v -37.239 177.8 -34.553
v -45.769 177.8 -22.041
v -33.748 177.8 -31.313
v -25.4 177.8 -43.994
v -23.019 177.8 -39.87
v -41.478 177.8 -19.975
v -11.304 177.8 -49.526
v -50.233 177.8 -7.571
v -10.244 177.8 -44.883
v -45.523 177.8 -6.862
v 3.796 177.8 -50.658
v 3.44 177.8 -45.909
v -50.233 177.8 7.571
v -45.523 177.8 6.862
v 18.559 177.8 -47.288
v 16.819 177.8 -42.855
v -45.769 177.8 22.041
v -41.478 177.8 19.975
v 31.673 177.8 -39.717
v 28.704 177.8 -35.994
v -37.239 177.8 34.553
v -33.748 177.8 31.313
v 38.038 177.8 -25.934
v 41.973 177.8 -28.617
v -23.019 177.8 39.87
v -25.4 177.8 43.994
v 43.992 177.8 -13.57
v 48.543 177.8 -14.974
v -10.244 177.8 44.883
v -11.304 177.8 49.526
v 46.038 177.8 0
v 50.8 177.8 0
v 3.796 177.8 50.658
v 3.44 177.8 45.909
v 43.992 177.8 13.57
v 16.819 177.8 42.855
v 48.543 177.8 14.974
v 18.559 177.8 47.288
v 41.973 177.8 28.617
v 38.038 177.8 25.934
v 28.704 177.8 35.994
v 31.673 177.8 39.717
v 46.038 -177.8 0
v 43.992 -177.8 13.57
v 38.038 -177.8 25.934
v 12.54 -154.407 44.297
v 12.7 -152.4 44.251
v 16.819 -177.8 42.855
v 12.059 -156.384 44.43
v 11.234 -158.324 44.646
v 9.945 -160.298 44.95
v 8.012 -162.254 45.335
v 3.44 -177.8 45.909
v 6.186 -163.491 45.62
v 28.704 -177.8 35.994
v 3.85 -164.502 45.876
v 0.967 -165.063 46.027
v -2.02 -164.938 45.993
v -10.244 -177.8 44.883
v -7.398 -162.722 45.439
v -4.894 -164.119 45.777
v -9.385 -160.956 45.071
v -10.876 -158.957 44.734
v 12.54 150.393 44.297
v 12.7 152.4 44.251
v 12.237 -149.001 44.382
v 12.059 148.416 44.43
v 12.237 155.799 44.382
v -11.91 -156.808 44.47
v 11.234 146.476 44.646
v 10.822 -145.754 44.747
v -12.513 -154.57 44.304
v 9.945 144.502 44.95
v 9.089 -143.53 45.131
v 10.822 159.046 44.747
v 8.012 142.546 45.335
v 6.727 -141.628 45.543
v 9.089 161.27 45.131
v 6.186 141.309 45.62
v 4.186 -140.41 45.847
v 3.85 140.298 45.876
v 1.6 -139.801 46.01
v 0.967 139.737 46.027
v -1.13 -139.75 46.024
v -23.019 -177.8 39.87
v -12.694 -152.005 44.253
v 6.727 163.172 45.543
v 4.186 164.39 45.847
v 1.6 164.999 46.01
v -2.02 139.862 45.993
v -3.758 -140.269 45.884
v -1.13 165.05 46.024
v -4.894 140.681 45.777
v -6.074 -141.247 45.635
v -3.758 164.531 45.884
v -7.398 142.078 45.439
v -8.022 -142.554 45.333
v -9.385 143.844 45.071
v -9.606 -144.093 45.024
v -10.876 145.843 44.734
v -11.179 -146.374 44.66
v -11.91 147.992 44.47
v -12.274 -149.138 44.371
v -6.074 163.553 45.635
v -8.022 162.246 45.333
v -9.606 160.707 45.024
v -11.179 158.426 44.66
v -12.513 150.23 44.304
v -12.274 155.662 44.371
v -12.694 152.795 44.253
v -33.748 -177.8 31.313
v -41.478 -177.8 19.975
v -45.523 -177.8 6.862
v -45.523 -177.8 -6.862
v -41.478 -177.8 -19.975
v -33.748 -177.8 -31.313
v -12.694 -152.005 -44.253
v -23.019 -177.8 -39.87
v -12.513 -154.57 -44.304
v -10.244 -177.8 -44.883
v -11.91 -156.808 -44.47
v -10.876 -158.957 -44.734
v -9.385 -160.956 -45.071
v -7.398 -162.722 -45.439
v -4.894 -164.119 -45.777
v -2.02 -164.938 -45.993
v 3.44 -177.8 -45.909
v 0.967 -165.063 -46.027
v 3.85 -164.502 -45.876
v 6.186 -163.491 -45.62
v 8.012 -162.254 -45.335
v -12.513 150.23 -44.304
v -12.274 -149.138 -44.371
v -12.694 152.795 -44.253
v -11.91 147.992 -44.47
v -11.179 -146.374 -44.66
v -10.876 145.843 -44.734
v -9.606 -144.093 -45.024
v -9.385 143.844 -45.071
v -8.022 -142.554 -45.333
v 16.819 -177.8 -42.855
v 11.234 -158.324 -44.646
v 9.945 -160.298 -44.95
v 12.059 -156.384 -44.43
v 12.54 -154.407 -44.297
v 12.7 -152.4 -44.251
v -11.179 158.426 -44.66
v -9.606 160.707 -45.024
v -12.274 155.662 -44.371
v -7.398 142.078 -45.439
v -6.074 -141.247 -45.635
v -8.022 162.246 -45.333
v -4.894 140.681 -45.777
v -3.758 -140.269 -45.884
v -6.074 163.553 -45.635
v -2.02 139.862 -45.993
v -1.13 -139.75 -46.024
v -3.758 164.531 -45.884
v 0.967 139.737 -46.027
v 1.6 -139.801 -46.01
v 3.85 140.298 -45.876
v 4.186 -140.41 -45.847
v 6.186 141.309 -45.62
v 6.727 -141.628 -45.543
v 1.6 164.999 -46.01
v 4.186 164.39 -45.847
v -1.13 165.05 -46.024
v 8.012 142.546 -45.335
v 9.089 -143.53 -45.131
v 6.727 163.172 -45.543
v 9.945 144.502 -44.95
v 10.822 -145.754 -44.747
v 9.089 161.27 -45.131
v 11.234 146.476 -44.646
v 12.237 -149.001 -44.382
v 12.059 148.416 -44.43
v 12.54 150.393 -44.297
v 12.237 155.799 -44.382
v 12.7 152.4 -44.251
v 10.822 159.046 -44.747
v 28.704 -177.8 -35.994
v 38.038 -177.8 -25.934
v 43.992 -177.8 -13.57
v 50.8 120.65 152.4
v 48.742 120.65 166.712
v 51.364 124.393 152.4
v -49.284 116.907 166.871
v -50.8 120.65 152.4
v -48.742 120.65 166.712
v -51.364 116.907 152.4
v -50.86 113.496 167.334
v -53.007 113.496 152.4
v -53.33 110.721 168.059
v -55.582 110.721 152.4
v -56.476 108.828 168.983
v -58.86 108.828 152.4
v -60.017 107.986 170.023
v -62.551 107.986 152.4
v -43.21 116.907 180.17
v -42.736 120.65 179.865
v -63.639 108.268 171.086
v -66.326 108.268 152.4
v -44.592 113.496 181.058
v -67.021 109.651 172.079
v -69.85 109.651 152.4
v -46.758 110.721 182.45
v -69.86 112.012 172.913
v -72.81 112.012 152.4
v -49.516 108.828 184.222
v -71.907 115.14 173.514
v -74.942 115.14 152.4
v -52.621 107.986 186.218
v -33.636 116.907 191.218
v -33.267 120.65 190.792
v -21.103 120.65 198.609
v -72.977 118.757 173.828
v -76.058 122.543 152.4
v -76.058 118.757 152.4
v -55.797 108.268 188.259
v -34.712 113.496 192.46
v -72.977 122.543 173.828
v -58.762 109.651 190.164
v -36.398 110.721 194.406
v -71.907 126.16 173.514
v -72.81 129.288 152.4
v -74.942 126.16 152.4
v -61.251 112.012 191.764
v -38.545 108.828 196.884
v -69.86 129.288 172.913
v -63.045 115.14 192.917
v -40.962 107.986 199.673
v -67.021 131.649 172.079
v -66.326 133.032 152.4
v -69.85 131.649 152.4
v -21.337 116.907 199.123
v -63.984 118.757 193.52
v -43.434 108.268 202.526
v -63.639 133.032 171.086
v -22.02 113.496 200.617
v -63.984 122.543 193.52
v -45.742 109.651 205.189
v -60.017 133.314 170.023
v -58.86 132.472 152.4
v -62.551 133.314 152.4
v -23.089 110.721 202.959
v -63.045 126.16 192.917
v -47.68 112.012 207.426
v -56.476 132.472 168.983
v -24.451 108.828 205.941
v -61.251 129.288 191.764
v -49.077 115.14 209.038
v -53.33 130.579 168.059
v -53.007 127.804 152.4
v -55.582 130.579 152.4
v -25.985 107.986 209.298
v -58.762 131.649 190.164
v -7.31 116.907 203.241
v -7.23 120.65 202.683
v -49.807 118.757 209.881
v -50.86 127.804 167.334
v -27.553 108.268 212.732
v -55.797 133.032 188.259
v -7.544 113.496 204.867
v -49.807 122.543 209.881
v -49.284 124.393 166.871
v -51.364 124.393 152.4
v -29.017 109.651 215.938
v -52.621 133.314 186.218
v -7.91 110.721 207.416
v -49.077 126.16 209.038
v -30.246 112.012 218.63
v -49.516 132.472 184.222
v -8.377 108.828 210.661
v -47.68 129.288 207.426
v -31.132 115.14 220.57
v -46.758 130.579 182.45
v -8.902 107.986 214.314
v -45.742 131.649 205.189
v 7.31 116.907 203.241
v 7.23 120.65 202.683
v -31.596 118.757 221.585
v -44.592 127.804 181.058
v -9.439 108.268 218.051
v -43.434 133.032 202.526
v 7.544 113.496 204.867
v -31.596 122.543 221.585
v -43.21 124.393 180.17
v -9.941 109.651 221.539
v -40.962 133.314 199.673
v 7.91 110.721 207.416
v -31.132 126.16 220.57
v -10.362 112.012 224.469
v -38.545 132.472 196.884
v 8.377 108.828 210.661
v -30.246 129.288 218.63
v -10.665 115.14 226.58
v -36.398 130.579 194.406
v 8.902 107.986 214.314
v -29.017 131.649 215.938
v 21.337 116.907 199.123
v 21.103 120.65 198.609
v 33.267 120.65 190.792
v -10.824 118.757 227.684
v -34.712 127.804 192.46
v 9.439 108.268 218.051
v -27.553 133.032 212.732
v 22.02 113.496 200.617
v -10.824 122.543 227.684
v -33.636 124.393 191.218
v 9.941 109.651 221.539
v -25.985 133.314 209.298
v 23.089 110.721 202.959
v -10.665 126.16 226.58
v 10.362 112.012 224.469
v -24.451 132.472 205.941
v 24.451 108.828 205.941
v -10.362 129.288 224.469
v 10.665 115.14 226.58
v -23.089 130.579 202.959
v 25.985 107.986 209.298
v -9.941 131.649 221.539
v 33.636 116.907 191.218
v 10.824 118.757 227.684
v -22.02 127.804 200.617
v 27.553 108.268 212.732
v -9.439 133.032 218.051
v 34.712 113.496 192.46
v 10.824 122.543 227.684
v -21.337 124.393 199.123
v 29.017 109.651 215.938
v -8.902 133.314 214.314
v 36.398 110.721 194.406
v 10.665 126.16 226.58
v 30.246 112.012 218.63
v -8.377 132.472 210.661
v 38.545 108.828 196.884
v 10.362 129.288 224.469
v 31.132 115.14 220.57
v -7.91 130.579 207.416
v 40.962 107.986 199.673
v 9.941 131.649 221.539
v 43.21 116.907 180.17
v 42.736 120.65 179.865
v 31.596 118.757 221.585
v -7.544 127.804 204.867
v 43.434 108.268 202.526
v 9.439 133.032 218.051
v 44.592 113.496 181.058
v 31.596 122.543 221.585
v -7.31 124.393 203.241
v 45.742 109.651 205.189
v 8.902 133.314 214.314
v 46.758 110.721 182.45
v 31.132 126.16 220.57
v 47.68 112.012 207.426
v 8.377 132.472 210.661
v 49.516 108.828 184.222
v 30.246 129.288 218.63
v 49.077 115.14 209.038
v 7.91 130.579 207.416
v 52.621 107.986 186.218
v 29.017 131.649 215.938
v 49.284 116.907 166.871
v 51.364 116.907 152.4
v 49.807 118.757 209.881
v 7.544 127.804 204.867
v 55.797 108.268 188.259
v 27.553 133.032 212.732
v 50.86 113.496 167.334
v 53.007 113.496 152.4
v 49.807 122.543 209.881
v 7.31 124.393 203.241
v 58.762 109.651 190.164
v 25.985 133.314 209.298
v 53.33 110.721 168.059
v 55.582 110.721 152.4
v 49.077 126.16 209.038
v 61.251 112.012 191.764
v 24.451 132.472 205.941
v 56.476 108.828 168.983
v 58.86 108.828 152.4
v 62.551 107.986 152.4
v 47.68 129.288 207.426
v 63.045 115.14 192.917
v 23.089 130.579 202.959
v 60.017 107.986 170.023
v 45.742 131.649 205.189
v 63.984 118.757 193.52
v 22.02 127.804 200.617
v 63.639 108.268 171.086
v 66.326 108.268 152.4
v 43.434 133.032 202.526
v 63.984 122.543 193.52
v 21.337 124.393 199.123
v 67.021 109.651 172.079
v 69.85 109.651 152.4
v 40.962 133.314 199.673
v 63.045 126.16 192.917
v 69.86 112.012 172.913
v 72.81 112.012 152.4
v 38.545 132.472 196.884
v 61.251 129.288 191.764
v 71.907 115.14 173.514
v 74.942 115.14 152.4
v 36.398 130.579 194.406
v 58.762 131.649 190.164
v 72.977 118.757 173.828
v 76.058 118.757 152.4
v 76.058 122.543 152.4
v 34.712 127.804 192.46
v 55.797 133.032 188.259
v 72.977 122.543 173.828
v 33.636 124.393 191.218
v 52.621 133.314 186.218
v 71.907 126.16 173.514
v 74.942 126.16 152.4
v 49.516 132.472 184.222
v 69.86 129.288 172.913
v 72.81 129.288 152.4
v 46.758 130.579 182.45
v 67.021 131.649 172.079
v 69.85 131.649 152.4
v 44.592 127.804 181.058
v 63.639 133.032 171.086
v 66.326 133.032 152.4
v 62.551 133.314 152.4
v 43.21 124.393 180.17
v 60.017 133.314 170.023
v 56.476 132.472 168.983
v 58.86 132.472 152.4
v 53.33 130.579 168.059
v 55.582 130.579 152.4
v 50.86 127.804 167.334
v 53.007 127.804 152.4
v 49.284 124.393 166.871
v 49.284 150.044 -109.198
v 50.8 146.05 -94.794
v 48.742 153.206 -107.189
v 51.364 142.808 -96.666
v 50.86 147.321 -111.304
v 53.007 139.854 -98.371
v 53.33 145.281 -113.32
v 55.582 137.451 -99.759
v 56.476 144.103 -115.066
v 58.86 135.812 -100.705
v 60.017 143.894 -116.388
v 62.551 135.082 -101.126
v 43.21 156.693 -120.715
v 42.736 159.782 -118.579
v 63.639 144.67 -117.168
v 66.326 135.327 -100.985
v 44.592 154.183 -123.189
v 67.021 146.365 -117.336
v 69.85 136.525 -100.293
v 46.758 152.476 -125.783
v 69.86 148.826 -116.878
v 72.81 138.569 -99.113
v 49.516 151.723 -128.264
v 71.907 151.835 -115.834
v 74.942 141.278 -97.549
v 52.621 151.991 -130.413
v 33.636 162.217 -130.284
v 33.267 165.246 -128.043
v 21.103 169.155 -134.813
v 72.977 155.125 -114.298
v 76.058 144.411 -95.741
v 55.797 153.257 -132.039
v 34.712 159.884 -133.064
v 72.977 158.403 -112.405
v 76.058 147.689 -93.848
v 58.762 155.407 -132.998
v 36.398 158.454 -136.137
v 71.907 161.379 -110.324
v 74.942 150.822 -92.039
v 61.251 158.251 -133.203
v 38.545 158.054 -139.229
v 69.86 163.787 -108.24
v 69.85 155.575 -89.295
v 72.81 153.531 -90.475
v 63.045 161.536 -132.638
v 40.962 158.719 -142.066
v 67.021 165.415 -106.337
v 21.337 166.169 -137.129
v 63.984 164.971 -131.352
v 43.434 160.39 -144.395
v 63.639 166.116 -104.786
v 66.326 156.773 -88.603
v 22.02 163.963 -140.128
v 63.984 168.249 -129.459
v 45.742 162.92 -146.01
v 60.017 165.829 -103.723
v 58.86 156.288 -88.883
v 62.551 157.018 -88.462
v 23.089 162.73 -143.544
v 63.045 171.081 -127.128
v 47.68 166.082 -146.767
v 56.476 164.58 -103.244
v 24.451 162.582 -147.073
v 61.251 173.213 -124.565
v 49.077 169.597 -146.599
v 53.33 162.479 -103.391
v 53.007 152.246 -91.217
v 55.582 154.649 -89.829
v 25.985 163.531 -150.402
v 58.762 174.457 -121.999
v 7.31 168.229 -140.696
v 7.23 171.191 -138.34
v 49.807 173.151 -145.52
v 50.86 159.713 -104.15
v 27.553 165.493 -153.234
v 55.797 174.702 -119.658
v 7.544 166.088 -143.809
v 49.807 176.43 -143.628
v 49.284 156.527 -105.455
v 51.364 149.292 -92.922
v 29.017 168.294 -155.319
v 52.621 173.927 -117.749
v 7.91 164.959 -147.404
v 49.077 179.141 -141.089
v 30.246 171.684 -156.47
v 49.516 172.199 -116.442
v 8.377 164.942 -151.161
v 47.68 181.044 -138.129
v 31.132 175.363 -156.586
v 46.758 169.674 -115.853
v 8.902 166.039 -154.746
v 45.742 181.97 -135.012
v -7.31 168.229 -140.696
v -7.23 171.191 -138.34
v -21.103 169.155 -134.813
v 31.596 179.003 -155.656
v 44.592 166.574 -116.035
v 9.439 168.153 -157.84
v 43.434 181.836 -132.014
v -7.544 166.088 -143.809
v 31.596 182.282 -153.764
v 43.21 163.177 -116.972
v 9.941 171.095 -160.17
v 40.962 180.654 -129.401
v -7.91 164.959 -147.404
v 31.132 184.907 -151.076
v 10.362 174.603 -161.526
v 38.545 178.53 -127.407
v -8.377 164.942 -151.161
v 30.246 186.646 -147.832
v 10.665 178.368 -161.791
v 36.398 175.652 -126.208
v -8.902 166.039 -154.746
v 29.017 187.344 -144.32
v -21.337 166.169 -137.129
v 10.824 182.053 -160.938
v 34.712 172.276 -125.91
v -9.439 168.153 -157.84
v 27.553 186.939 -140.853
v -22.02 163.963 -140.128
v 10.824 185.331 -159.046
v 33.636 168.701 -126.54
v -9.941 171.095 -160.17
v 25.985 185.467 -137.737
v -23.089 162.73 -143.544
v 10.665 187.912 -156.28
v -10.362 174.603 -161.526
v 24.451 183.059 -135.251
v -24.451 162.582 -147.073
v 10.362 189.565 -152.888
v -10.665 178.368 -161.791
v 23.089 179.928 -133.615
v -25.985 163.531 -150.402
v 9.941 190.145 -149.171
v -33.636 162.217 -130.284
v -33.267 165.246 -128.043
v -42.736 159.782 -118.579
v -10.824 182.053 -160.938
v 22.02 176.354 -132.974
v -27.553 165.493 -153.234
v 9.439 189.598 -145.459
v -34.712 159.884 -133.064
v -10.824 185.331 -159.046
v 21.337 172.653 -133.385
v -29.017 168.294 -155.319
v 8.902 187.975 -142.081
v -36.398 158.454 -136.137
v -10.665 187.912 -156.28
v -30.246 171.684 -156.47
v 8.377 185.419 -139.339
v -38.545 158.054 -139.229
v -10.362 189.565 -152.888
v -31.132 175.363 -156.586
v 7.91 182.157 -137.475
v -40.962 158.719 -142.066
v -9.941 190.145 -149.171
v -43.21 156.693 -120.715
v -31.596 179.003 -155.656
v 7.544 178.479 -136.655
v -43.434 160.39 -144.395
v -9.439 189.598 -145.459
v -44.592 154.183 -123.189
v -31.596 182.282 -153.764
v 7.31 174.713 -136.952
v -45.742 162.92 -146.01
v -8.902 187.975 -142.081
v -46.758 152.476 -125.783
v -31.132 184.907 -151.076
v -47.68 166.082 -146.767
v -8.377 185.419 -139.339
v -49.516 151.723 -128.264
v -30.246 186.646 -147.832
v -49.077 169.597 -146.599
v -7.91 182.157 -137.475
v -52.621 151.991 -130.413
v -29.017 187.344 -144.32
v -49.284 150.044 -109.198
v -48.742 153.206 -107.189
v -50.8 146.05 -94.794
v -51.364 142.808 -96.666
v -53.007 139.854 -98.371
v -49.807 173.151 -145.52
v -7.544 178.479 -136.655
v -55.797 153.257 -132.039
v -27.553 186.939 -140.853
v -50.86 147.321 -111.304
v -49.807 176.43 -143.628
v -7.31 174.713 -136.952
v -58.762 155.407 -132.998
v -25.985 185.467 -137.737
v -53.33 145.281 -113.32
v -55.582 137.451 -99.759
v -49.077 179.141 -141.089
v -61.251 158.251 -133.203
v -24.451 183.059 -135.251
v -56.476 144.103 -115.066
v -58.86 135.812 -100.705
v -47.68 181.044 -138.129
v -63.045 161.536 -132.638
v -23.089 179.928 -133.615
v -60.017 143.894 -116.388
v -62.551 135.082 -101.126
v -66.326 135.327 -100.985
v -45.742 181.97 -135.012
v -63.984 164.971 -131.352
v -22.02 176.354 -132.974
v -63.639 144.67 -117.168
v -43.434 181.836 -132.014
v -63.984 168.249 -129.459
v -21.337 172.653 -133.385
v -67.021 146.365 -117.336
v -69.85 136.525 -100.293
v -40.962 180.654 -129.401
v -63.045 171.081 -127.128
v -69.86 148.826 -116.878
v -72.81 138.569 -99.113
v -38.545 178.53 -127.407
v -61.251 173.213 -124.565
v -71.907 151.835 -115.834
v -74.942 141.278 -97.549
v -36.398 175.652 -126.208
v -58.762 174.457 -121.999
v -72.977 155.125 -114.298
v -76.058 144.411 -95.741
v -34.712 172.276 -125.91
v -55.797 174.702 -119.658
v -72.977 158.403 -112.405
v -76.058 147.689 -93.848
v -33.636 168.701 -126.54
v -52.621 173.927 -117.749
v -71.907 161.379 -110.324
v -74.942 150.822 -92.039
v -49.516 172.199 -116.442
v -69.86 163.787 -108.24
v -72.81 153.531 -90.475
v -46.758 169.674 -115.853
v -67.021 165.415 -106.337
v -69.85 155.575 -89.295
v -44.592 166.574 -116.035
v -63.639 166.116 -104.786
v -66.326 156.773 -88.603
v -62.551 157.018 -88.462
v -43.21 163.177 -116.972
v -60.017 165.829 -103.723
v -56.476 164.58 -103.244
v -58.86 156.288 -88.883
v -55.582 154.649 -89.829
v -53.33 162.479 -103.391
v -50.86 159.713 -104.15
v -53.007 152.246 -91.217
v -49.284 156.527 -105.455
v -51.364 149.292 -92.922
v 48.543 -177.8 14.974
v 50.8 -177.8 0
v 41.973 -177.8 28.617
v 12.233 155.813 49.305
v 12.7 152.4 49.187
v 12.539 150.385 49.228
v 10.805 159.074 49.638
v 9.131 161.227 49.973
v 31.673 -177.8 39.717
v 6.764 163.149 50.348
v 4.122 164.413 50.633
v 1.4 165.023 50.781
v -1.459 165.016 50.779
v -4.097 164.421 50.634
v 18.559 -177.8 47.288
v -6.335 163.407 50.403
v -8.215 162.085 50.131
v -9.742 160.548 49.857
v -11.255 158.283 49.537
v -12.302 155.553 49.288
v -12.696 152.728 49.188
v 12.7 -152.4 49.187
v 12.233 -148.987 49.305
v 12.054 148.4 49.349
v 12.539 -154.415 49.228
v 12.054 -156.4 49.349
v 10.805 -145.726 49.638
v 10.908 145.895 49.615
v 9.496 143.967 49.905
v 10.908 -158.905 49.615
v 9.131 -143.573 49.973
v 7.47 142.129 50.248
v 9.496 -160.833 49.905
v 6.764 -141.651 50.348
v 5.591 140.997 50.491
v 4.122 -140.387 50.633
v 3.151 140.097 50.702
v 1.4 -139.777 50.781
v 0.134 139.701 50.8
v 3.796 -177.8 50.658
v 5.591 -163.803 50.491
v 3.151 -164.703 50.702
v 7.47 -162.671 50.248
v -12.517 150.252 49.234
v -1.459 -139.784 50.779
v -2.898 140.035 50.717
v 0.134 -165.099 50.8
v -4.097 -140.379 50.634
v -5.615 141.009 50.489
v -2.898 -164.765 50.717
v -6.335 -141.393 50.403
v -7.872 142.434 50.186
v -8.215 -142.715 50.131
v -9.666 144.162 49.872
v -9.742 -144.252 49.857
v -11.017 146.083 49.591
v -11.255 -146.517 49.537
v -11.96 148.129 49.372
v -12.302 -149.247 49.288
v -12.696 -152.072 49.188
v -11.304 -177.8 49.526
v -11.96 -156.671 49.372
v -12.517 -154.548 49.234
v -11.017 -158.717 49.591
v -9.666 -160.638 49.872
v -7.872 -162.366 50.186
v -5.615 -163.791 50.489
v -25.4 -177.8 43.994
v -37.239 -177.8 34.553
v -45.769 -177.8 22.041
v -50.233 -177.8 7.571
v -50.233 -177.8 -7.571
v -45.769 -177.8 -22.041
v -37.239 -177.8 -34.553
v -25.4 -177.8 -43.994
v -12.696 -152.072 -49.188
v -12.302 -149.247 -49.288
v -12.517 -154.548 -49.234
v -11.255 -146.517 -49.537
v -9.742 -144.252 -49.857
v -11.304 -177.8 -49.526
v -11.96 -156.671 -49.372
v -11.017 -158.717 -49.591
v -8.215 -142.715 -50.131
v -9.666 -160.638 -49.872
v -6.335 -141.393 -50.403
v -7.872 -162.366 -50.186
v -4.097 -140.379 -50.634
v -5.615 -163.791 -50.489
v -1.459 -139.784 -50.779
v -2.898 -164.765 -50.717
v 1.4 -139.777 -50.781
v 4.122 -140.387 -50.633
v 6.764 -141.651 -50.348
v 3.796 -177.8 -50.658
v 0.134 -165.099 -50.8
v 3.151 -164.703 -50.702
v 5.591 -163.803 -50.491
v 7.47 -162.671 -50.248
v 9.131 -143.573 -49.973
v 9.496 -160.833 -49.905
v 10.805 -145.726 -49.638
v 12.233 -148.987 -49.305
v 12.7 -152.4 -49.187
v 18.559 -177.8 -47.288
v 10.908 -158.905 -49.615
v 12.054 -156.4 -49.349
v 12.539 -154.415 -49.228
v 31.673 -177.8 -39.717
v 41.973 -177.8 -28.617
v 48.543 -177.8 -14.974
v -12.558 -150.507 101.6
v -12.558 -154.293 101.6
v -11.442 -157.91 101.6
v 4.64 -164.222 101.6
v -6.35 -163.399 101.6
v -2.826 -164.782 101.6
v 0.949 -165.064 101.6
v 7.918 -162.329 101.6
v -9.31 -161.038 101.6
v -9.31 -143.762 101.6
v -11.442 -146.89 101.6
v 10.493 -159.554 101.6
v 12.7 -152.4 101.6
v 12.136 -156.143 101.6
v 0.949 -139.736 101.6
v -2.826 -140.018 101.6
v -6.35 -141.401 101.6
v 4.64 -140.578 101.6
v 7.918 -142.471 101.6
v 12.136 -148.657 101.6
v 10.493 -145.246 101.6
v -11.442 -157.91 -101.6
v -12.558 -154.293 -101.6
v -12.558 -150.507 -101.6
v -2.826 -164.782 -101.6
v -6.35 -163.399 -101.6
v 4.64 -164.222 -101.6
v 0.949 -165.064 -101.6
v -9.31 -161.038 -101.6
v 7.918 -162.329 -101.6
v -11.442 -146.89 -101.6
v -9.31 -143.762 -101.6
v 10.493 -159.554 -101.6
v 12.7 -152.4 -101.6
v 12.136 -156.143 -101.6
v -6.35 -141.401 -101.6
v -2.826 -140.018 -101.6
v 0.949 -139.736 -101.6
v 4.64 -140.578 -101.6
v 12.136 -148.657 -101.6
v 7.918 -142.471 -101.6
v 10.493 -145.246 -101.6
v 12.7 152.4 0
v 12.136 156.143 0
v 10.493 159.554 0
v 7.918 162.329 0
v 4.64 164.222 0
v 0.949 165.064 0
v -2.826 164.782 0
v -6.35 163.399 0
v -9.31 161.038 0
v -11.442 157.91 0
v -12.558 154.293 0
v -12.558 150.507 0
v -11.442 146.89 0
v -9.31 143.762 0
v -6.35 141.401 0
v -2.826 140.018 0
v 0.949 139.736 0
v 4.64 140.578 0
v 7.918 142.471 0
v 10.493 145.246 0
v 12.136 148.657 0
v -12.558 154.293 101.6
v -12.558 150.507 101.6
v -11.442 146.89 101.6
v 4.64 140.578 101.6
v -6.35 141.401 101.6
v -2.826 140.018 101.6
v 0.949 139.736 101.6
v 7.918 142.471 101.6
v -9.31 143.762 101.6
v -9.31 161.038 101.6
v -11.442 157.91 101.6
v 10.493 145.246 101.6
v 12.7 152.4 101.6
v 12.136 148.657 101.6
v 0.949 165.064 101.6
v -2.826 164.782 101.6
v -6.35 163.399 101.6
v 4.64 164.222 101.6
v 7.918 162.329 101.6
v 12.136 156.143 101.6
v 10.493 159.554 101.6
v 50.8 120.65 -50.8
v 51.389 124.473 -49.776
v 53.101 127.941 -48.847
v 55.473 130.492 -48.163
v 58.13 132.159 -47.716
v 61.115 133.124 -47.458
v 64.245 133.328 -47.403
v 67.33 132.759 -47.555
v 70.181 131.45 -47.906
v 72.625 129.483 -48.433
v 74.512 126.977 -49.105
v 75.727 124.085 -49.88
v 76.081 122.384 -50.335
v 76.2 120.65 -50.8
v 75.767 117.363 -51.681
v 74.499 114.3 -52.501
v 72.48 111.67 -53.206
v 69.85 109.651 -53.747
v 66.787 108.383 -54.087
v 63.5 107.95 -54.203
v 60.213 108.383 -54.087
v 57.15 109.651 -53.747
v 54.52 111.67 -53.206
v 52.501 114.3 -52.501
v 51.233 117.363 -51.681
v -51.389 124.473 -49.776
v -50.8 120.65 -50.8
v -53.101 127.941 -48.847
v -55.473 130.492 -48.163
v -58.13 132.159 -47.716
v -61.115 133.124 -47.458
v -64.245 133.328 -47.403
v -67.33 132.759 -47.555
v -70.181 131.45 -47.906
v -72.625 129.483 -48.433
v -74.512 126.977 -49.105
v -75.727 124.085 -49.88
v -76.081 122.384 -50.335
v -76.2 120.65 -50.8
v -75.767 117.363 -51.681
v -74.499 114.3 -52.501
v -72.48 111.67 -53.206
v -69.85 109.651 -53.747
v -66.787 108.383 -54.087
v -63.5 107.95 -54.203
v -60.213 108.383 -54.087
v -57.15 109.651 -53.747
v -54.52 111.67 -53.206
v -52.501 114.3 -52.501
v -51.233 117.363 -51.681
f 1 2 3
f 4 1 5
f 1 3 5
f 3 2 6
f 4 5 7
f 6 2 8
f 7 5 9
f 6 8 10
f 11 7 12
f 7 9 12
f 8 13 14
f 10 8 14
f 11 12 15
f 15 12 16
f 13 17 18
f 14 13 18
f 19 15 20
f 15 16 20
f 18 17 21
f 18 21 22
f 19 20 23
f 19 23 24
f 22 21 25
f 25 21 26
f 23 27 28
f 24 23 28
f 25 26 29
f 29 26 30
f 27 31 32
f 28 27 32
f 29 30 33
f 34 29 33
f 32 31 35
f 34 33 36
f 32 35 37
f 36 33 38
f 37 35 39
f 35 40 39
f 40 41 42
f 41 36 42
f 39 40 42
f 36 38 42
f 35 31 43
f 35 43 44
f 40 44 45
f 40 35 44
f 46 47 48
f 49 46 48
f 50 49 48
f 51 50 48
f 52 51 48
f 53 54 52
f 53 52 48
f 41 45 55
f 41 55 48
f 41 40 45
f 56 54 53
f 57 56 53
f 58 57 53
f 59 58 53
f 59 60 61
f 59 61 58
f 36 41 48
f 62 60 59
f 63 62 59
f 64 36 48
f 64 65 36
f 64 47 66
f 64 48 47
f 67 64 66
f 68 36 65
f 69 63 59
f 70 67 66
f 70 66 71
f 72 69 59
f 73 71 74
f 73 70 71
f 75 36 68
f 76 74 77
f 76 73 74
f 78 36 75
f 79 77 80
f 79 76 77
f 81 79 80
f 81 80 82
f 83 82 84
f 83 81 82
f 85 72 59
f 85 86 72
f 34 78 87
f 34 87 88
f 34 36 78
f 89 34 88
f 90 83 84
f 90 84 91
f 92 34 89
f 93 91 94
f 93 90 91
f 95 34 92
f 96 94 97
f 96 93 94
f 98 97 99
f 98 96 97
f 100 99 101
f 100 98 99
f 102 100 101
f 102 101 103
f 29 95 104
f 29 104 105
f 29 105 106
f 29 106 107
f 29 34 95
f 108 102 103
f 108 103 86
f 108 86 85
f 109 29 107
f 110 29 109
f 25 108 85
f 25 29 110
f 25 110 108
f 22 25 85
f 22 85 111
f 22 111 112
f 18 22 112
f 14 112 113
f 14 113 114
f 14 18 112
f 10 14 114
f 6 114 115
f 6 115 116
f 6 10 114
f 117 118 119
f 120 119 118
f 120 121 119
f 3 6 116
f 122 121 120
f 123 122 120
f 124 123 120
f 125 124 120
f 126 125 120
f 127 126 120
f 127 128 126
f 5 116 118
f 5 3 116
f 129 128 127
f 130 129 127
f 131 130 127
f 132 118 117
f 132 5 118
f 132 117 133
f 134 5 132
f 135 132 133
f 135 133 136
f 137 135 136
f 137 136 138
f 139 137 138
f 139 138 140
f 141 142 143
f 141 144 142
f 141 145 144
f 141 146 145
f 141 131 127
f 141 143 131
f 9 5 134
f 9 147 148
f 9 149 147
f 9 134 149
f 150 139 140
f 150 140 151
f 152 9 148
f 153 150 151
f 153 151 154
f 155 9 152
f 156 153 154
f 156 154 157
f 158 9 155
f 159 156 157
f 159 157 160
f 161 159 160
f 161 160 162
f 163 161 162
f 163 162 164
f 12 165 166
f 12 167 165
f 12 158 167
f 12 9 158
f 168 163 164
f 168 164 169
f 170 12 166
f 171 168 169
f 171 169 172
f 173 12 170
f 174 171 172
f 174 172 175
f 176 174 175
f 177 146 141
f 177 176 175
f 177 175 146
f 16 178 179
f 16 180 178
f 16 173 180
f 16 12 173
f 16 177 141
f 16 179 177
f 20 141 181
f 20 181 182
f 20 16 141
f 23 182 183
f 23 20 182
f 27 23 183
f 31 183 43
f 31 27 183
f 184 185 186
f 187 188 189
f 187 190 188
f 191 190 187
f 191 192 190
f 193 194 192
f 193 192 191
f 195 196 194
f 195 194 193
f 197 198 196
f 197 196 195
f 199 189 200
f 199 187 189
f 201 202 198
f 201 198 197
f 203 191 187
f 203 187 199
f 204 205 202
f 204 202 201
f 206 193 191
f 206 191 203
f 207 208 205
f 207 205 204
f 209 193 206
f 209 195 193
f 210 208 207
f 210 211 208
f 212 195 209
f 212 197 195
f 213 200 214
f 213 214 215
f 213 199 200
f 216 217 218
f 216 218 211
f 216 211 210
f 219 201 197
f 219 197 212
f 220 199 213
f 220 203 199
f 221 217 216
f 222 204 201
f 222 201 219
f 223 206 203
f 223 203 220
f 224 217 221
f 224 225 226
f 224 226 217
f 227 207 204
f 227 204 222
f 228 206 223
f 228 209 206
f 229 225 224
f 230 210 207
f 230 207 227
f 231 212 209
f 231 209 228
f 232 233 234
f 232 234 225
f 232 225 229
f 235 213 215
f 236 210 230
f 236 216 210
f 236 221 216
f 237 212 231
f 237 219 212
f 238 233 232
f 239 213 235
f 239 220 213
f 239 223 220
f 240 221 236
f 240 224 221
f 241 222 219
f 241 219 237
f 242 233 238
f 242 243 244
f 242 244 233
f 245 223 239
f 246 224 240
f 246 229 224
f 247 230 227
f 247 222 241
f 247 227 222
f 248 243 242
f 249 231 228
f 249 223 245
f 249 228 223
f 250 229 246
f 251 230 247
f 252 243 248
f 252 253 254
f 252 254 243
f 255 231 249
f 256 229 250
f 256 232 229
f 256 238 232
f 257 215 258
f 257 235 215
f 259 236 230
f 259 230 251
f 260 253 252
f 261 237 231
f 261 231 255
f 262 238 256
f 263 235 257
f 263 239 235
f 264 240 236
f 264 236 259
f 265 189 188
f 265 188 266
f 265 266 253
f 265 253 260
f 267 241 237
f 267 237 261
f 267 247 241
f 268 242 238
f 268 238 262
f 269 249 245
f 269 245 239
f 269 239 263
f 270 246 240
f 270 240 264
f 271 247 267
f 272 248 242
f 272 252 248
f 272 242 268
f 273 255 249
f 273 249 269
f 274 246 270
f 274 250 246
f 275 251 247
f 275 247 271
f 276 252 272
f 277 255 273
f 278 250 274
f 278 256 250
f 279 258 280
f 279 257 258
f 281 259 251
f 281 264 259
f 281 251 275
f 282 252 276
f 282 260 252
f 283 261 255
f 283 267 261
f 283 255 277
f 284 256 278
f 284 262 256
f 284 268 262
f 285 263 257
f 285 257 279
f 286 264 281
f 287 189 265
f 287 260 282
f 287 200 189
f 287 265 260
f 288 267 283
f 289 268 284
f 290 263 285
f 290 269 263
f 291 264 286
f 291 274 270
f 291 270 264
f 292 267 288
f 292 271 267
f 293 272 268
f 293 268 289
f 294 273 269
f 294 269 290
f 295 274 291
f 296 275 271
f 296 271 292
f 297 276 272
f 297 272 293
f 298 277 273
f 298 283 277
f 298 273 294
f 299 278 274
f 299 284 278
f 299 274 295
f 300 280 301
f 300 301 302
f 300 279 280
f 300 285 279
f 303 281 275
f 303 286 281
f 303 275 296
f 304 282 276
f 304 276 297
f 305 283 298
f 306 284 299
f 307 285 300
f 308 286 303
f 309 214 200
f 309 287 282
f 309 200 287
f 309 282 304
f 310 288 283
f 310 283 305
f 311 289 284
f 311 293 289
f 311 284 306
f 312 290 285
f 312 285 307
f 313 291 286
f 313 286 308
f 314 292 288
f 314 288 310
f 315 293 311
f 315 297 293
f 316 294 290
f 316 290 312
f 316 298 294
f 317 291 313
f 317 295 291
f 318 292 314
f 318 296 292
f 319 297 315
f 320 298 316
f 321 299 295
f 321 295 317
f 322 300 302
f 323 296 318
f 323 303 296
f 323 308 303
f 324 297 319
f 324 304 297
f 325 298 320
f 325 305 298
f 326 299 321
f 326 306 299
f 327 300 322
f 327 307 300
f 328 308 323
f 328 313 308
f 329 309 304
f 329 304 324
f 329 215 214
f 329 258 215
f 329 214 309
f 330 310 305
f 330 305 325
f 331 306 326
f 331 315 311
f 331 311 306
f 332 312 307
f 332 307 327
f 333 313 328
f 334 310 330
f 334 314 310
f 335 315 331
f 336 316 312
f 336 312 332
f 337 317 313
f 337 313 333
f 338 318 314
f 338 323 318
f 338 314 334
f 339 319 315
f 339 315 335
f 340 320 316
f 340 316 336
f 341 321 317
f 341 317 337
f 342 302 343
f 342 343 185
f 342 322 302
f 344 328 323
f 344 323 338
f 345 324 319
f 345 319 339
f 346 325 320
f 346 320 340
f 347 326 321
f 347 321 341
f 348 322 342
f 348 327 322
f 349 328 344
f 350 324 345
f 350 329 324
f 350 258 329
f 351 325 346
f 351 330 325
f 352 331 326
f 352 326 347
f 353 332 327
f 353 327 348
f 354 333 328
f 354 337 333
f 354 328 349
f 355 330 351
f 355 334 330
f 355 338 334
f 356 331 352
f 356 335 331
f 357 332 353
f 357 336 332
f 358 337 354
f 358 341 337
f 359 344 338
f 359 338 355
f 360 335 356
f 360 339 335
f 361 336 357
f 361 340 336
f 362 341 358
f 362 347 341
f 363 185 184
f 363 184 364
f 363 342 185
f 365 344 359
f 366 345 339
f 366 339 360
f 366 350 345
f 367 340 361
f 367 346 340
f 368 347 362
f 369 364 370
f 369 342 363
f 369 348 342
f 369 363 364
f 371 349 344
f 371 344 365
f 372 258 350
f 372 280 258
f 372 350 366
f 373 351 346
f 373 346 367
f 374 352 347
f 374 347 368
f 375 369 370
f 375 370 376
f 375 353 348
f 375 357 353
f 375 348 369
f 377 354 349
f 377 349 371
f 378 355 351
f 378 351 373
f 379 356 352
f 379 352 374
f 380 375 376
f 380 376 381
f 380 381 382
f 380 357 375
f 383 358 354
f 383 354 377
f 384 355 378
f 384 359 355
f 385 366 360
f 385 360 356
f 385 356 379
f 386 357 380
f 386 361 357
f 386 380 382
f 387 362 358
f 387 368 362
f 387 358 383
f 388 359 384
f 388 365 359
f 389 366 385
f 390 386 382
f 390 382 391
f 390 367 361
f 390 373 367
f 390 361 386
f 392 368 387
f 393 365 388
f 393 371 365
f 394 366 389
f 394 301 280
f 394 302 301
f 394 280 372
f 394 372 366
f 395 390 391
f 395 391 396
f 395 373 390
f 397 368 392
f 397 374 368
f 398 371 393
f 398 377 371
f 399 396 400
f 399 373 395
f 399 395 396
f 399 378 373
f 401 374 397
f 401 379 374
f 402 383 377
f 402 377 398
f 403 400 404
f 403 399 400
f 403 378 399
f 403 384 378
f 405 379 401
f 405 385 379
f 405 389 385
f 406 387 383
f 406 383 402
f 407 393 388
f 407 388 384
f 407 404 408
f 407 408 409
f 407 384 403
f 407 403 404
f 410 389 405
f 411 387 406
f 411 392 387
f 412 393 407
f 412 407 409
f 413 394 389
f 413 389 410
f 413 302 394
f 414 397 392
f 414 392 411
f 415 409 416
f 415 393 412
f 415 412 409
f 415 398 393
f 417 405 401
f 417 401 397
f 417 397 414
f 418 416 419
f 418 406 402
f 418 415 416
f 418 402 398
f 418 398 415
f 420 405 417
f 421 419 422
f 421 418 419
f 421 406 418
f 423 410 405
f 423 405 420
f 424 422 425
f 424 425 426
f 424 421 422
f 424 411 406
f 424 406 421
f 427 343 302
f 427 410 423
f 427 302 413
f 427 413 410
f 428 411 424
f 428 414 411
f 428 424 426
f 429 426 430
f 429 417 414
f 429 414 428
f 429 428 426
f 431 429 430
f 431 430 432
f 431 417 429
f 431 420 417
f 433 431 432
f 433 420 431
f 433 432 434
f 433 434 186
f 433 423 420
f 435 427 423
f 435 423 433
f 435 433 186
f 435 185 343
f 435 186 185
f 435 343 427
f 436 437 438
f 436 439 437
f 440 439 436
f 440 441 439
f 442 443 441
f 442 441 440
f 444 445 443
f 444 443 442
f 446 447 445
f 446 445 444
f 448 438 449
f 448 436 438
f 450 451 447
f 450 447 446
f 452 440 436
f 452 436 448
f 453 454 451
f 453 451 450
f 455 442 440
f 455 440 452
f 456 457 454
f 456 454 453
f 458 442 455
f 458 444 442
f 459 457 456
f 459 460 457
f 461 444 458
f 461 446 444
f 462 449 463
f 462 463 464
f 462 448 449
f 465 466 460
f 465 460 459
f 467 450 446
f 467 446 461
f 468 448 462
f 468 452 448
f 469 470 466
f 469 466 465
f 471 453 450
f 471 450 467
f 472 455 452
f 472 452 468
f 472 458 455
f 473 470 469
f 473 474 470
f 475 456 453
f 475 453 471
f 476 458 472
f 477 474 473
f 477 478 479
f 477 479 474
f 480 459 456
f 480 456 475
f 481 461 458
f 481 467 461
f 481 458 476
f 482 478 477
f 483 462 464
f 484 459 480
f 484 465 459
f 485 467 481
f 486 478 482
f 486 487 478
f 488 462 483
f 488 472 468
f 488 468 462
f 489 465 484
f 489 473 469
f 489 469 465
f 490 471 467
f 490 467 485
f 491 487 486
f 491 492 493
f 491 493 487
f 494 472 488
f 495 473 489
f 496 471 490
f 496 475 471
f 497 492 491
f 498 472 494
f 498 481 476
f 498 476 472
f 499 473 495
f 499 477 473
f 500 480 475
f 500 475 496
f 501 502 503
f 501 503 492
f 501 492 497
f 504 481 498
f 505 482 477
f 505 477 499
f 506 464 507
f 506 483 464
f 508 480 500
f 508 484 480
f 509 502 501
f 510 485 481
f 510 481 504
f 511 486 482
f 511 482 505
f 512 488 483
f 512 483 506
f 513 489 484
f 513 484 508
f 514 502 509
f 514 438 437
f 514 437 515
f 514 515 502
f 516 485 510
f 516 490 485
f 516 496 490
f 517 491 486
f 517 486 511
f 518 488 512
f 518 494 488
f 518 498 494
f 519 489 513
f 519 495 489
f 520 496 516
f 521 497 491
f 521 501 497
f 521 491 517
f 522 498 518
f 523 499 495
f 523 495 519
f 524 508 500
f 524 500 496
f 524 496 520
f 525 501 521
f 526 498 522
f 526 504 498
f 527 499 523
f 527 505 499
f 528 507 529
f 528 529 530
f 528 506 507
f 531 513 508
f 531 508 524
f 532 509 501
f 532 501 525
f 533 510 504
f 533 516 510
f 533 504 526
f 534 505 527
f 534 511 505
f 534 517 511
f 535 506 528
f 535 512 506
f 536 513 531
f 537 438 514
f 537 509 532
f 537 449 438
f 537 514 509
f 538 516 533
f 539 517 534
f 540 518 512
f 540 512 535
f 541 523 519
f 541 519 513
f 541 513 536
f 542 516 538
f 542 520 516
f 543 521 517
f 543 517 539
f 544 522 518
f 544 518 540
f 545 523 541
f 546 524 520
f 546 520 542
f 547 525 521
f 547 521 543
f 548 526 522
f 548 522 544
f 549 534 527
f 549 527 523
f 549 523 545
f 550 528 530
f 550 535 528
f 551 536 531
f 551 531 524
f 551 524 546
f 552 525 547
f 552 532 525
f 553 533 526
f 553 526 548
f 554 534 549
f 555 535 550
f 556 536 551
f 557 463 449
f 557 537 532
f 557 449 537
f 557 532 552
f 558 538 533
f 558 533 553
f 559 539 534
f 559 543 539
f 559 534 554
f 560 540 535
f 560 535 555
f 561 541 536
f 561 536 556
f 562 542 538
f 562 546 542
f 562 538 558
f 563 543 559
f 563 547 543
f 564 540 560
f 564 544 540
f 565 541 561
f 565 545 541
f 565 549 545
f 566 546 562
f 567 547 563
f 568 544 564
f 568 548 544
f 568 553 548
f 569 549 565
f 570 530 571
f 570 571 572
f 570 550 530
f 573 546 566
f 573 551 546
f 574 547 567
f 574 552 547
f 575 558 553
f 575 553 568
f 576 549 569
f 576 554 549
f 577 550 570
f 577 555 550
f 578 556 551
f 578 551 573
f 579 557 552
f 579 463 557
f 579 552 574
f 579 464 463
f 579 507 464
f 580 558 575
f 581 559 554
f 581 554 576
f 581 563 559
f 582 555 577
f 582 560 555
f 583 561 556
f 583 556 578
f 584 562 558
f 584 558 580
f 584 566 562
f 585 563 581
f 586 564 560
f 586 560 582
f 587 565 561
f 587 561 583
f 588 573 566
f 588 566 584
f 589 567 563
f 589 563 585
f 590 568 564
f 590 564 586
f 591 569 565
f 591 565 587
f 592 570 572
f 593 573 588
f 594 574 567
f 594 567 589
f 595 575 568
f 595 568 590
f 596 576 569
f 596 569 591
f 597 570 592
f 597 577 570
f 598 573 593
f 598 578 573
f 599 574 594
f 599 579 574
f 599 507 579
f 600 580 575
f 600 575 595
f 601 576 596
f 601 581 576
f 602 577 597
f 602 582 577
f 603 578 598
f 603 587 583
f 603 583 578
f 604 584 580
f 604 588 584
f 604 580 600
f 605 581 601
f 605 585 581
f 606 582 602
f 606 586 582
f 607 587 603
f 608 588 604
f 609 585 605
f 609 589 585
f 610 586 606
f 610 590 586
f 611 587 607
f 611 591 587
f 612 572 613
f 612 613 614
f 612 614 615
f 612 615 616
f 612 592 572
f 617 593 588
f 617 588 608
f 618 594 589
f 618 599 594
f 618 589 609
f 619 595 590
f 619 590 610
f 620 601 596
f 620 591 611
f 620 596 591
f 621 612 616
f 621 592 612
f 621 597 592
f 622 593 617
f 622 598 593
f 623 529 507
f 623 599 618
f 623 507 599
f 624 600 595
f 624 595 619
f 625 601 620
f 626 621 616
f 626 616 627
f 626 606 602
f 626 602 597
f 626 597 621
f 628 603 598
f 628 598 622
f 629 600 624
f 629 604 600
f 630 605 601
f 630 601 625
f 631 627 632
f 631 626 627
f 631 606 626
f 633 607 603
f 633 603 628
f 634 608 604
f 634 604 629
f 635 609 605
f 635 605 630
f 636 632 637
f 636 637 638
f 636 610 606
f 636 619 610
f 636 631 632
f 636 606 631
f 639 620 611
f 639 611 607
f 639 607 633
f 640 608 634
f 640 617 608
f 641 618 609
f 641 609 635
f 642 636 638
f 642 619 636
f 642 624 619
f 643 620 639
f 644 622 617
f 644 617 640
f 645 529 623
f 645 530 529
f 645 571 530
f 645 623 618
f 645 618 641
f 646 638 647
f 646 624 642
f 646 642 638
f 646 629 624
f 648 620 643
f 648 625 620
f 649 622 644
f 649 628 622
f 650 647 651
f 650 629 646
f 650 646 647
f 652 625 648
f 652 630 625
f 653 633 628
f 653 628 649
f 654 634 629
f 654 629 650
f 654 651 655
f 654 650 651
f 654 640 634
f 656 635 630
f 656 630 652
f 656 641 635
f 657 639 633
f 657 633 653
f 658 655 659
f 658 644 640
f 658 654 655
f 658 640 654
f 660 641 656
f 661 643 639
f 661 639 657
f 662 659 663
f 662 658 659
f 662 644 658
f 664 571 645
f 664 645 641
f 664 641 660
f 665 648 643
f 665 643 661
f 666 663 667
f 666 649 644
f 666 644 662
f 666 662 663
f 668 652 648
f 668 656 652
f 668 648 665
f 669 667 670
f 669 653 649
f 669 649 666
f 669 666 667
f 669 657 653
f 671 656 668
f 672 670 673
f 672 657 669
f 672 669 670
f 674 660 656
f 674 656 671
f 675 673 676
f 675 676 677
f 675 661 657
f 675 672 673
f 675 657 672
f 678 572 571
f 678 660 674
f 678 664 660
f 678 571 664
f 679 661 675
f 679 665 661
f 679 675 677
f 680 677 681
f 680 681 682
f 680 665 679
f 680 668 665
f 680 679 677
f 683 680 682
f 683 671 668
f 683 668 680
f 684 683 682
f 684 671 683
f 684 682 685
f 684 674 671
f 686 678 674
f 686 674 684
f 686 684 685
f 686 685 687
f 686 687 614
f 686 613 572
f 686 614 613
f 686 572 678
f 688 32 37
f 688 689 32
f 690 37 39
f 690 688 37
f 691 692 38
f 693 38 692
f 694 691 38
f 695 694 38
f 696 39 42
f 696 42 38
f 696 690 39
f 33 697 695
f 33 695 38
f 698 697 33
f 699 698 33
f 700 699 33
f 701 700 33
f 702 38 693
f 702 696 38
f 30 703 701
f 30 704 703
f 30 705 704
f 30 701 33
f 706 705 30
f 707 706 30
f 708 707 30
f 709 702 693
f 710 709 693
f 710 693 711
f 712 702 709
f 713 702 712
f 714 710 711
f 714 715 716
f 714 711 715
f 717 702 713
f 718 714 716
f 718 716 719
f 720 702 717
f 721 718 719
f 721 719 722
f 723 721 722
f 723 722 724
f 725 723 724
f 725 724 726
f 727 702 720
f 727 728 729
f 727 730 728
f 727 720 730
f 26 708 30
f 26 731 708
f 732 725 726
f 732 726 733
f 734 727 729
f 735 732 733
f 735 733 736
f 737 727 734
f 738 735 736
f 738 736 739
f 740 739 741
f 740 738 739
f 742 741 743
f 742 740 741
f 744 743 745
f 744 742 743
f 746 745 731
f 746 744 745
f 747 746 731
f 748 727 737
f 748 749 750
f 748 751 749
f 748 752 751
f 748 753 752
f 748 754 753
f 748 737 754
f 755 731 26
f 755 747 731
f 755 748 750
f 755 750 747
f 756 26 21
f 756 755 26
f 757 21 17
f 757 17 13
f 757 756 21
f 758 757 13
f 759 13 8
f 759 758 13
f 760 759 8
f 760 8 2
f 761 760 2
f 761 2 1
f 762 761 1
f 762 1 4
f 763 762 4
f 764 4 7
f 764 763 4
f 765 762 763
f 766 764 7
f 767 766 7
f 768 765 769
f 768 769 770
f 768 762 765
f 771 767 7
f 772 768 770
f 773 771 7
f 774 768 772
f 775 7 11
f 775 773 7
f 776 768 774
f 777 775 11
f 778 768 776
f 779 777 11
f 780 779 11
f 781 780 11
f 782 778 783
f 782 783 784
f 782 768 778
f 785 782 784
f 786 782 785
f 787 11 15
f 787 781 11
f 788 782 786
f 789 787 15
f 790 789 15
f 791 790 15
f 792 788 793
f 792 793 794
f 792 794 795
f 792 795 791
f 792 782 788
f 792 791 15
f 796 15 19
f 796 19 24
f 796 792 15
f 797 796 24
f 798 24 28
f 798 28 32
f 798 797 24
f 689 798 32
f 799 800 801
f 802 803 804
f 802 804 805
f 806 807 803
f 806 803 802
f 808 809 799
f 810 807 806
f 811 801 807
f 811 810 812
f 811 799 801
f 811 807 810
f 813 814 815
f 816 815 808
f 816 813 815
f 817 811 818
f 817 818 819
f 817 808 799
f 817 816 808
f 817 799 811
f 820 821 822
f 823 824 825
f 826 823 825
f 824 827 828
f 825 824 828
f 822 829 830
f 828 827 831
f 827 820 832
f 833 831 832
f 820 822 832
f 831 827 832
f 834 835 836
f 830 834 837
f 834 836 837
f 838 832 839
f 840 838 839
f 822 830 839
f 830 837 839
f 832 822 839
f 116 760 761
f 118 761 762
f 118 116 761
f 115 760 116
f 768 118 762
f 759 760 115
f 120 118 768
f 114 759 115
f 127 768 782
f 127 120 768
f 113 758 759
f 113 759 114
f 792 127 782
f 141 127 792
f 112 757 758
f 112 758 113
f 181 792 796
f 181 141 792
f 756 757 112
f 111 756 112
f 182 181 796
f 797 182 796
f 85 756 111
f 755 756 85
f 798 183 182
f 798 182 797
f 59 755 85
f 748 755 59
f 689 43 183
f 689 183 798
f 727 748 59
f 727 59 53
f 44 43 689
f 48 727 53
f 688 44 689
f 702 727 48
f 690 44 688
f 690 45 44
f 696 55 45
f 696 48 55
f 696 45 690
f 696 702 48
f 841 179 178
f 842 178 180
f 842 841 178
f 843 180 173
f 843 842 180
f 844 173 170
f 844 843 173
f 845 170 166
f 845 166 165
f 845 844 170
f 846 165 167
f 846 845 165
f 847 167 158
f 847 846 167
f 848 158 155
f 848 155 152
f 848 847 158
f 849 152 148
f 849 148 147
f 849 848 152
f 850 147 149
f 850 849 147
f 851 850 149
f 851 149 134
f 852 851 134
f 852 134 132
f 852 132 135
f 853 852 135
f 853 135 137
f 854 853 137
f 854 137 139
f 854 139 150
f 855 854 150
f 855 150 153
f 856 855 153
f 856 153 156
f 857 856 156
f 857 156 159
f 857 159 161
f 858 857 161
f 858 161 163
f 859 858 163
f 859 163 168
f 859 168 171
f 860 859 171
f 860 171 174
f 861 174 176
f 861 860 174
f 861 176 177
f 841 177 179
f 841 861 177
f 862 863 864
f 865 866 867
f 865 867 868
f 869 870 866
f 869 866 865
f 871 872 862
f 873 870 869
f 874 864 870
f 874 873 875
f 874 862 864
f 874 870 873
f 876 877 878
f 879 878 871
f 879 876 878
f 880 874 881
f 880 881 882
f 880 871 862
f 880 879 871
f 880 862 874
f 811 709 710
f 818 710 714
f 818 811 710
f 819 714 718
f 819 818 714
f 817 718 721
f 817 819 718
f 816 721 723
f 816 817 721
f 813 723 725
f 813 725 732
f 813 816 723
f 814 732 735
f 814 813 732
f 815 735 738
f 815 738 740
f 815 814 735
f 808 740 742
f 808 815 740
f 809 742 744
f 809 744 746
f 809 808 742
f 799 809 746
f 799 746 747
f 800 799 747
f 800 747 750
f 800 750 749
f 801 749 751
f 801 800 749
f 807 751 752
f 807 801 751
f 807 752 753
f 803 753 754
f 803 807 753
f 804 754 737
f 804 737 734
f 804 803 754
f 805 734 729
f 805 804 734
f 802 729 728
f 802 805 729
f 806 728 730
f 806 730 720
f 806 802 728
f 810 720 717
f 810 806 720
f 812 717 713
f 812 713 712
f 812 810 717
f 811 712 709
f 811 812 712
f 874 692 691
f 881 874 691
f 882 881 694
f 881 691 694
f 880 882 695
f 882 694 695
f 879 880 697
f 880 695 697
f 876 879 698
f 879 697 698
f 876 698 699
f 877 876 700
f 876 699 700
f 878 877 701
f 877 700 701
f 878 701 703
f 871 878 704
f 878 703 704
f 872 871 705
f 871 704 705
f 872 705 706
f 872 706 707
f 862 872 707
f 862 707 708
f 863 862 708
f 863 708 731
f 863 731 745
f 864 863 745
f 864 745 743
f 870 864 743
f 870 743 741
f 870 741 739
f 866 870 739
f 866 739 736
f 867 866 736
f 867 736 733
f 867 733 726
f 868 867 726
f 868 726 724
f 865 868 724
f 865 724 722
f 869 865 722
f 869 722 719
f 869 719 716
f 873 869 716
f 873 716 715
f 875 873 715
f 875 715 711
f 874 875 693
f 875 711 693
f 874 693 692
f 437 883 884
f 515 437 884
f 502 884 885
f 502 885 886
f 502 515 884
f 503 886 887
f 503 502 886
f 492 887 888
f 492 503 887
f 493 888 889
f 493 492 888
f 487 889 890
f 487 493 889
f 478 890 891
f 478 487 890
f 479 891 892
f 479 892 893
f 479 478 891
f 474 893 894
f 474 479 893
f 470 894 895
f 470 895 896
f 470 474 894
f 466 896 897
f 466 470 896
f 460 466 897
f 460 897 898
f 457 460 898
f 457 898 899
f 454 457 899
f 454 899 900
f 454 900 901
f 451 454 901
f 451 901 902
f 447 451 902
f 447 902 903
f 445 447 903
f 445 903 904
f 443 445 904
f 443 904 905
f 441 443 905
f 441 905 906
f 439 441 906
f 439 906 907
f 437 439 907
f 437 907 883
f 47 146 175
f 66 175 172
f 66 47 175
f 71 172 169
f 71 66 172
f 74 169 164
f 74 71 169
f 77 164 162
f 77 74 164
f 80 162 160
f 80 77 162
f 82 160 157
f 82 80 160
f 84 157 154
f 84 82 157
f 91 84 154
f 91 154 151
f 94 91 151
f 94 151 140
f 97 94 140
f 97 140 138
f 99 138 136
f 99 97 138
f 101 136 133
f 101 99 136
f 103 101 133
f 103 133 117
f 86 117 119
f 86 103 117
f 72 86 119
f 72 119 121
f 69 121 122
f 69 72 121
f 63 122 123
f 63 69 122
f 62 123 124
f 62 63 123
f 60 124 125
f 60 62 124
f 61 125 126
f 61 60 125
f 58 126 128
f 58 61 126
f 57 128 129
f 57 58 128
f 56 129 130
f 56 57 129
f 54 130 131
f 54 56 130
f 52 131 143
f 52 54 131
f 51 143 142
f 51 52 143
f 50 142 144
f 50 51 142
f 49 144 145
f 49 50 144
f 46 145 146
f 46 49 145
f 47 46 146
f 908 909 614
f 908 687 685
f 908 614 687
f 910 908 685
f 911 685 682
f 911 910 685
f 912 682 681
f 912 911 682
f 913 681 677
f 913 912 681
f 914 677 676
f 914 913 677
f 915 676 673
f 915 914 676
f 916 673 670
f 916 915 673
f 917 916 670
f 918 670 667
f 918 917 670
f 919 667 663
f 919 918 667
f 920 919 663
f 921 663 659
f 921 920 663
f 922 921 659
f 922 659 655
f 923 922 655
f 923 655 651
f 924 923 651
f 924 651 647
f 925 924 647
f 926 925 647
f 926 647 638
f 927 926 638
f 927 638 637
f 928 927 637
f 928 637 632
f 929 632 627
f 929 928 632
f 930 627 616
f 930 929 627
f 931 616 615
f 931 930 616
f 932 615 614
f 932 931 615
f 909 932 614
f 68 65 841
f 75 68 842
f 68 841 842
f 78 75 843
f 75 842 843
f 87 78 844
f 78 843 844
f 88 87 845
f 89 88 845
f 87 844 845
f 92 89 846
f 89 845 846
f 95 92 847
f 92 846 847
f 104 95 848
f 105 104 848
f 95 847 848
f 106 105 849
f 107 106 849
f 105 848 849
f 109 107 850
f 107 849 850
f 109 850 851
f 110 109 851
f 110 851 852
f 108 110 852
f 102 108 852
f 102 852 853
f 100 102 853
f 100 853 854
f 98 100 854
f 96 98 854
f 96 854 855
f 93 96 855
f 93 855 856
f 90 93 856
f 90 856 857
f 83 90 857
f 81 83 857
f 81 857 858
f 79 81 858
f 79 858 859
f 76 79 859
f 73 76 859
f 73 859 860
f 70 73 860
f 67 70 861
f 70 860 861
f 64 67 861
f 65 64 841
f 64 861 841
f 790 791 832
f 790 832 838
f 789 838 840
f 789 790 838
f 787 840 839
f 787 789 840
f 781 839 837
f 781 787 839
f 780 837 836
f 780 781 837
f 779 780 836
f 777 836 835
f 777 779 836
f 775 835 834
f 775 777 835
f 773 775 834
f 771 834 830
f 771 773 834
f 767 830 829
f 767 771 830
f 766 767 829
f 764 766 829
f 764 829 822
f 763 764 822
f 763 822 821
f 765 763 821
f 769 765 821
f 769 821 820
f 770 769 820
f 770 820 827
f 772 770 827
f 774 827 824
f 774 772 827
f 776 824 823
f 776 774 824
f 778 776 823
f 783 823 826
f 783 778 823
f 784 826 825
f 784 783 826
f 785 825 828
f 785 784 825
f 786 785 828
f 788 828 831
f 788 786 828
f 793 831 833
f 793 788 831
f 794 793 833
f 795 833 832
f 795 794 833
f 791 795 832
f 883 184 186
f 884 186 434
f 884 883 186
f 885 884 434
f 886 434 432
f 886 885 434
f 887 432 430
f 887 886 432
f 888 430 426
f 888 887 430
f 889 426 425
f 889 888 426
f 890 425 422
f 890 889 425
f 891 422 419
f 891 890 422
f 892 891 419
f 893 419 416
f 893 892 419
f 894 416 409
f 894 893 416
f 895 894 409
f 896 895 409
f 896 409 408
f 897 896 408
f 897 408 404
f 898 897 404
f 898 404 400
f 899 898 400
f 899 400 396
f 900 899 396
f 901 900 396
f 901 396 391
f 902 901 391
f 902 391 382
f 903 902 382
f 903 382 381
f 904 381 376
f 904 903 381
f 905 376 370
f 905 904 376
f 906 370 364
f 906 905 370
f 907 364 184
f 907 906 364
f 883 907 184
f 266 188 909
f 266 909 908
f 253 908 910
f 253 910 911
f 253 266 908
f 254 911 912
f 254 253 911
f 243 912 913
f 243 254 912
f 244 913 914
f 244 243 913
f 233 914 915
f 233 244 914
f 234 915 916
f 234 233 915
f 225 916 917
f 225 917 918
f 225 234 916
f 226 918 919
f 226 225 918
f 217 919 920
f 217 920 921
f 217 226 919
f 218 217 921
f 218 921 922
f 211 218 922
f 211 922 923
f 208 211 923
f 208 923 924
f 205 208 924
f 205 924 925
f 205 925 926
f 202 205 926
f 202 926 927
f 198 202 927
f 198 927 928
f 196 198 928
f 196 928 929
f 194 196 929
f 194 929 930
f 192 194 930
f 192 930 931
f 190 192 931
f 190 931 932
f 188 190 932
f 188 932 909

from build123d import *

# Parameters (mm, degrees)
F0_R     = 50.8
F0_R_2   = 46.0375
F1_DEPTH = 177.8
F2_R     = 12.7
F3_DEPTH = 101.6
F4_DEPTH = 46.0375
F5_R     = 12.7
F6_DEPTH = 101.6
F11_R    = 12.7


with BuildPart() as f1:
    # F0 (on Front) → F1 (new body, symmetric)
    with BuildSketch(Plane.XZ):
        Circle(F0_R)
        Circle(F0_R_2, mode=Mode.SUBTRACT)
    extrude(amount=F1_DEPTH, both=True)



with BuildPart() as f3:
    # F2 (on Top) → F3 (new body)
    with BuildSketch(Plane.XY):
        with Locations((0, 152.4)):
            Circle(F2_R)
    extrude(amount=F3_DEPTH)


with BuildPart() as f1_1:
    add(f1.part)
    # F4 (add, through all): a face of the model
    f4_faces = [f3.part.faces().sort_by_distance(p)[0] for p in [
        (0, 152.4, 0),
    ]]

    add(f3.part)  # F4 merges F3
    extrude(f4_faces, amount=F4_DEPTH)

    # F5 (on Top) → F6 (join, symmetric)
    with BuildSketch(Plane.XY):
        with Locations((0, -152.4)):
            Circle(F5_R)
    extrude(amount=F6_DEPTH, both=True)


with BuildPart() as f12:
    # F12: sweep along a path in F8, F10, F8
    with BuildLine(Plane.XZ.offset(-120.65)) as f12_path:
        Line((-63.5, 0), (-63.5, 152.4))
        ThreePointArc((-63.5, 152.4), (0, 215.9), (63.5, 152.4))
        Line((63.5, 152.4), (63.5, 0))
        Line((63.5, 0), (63.5, -50.8))
    with BuildLine(Plane(origin=(0, 68.4904547439, 39.5429824833), x_dir=(1, 0, 0), z_dir=(0, -0.8660254038, -0.5))) as f12_path_2:
        Line((63.5, -104.3190905122), (63.5, -155.1190905122))
        ThreePointArc((63.5, -155.1190905122), (0, -218.6190905122), (-63.5, -155.1190905122))
        Line((-63.5, -155.1190905122), (-63.5, -104.3190905122))
    with BuildLine(Plane.XZ.offset(-120.65)) as f12_path_3:
        Line((-63.5, 0), (-63.5, -50.8))
    # F11 (on Top) → F12 (sweep)
    with BuildSketch(Plane.XY):
        with Locations((-63.5, 120.65)):
            Circle(F11_R)
    sweep(path=f12_path.line + f12_path_2.line + f12_path_3.line, transition=Transition.RIGHT)


solid = Compound([f1_1.part, f12.part])
